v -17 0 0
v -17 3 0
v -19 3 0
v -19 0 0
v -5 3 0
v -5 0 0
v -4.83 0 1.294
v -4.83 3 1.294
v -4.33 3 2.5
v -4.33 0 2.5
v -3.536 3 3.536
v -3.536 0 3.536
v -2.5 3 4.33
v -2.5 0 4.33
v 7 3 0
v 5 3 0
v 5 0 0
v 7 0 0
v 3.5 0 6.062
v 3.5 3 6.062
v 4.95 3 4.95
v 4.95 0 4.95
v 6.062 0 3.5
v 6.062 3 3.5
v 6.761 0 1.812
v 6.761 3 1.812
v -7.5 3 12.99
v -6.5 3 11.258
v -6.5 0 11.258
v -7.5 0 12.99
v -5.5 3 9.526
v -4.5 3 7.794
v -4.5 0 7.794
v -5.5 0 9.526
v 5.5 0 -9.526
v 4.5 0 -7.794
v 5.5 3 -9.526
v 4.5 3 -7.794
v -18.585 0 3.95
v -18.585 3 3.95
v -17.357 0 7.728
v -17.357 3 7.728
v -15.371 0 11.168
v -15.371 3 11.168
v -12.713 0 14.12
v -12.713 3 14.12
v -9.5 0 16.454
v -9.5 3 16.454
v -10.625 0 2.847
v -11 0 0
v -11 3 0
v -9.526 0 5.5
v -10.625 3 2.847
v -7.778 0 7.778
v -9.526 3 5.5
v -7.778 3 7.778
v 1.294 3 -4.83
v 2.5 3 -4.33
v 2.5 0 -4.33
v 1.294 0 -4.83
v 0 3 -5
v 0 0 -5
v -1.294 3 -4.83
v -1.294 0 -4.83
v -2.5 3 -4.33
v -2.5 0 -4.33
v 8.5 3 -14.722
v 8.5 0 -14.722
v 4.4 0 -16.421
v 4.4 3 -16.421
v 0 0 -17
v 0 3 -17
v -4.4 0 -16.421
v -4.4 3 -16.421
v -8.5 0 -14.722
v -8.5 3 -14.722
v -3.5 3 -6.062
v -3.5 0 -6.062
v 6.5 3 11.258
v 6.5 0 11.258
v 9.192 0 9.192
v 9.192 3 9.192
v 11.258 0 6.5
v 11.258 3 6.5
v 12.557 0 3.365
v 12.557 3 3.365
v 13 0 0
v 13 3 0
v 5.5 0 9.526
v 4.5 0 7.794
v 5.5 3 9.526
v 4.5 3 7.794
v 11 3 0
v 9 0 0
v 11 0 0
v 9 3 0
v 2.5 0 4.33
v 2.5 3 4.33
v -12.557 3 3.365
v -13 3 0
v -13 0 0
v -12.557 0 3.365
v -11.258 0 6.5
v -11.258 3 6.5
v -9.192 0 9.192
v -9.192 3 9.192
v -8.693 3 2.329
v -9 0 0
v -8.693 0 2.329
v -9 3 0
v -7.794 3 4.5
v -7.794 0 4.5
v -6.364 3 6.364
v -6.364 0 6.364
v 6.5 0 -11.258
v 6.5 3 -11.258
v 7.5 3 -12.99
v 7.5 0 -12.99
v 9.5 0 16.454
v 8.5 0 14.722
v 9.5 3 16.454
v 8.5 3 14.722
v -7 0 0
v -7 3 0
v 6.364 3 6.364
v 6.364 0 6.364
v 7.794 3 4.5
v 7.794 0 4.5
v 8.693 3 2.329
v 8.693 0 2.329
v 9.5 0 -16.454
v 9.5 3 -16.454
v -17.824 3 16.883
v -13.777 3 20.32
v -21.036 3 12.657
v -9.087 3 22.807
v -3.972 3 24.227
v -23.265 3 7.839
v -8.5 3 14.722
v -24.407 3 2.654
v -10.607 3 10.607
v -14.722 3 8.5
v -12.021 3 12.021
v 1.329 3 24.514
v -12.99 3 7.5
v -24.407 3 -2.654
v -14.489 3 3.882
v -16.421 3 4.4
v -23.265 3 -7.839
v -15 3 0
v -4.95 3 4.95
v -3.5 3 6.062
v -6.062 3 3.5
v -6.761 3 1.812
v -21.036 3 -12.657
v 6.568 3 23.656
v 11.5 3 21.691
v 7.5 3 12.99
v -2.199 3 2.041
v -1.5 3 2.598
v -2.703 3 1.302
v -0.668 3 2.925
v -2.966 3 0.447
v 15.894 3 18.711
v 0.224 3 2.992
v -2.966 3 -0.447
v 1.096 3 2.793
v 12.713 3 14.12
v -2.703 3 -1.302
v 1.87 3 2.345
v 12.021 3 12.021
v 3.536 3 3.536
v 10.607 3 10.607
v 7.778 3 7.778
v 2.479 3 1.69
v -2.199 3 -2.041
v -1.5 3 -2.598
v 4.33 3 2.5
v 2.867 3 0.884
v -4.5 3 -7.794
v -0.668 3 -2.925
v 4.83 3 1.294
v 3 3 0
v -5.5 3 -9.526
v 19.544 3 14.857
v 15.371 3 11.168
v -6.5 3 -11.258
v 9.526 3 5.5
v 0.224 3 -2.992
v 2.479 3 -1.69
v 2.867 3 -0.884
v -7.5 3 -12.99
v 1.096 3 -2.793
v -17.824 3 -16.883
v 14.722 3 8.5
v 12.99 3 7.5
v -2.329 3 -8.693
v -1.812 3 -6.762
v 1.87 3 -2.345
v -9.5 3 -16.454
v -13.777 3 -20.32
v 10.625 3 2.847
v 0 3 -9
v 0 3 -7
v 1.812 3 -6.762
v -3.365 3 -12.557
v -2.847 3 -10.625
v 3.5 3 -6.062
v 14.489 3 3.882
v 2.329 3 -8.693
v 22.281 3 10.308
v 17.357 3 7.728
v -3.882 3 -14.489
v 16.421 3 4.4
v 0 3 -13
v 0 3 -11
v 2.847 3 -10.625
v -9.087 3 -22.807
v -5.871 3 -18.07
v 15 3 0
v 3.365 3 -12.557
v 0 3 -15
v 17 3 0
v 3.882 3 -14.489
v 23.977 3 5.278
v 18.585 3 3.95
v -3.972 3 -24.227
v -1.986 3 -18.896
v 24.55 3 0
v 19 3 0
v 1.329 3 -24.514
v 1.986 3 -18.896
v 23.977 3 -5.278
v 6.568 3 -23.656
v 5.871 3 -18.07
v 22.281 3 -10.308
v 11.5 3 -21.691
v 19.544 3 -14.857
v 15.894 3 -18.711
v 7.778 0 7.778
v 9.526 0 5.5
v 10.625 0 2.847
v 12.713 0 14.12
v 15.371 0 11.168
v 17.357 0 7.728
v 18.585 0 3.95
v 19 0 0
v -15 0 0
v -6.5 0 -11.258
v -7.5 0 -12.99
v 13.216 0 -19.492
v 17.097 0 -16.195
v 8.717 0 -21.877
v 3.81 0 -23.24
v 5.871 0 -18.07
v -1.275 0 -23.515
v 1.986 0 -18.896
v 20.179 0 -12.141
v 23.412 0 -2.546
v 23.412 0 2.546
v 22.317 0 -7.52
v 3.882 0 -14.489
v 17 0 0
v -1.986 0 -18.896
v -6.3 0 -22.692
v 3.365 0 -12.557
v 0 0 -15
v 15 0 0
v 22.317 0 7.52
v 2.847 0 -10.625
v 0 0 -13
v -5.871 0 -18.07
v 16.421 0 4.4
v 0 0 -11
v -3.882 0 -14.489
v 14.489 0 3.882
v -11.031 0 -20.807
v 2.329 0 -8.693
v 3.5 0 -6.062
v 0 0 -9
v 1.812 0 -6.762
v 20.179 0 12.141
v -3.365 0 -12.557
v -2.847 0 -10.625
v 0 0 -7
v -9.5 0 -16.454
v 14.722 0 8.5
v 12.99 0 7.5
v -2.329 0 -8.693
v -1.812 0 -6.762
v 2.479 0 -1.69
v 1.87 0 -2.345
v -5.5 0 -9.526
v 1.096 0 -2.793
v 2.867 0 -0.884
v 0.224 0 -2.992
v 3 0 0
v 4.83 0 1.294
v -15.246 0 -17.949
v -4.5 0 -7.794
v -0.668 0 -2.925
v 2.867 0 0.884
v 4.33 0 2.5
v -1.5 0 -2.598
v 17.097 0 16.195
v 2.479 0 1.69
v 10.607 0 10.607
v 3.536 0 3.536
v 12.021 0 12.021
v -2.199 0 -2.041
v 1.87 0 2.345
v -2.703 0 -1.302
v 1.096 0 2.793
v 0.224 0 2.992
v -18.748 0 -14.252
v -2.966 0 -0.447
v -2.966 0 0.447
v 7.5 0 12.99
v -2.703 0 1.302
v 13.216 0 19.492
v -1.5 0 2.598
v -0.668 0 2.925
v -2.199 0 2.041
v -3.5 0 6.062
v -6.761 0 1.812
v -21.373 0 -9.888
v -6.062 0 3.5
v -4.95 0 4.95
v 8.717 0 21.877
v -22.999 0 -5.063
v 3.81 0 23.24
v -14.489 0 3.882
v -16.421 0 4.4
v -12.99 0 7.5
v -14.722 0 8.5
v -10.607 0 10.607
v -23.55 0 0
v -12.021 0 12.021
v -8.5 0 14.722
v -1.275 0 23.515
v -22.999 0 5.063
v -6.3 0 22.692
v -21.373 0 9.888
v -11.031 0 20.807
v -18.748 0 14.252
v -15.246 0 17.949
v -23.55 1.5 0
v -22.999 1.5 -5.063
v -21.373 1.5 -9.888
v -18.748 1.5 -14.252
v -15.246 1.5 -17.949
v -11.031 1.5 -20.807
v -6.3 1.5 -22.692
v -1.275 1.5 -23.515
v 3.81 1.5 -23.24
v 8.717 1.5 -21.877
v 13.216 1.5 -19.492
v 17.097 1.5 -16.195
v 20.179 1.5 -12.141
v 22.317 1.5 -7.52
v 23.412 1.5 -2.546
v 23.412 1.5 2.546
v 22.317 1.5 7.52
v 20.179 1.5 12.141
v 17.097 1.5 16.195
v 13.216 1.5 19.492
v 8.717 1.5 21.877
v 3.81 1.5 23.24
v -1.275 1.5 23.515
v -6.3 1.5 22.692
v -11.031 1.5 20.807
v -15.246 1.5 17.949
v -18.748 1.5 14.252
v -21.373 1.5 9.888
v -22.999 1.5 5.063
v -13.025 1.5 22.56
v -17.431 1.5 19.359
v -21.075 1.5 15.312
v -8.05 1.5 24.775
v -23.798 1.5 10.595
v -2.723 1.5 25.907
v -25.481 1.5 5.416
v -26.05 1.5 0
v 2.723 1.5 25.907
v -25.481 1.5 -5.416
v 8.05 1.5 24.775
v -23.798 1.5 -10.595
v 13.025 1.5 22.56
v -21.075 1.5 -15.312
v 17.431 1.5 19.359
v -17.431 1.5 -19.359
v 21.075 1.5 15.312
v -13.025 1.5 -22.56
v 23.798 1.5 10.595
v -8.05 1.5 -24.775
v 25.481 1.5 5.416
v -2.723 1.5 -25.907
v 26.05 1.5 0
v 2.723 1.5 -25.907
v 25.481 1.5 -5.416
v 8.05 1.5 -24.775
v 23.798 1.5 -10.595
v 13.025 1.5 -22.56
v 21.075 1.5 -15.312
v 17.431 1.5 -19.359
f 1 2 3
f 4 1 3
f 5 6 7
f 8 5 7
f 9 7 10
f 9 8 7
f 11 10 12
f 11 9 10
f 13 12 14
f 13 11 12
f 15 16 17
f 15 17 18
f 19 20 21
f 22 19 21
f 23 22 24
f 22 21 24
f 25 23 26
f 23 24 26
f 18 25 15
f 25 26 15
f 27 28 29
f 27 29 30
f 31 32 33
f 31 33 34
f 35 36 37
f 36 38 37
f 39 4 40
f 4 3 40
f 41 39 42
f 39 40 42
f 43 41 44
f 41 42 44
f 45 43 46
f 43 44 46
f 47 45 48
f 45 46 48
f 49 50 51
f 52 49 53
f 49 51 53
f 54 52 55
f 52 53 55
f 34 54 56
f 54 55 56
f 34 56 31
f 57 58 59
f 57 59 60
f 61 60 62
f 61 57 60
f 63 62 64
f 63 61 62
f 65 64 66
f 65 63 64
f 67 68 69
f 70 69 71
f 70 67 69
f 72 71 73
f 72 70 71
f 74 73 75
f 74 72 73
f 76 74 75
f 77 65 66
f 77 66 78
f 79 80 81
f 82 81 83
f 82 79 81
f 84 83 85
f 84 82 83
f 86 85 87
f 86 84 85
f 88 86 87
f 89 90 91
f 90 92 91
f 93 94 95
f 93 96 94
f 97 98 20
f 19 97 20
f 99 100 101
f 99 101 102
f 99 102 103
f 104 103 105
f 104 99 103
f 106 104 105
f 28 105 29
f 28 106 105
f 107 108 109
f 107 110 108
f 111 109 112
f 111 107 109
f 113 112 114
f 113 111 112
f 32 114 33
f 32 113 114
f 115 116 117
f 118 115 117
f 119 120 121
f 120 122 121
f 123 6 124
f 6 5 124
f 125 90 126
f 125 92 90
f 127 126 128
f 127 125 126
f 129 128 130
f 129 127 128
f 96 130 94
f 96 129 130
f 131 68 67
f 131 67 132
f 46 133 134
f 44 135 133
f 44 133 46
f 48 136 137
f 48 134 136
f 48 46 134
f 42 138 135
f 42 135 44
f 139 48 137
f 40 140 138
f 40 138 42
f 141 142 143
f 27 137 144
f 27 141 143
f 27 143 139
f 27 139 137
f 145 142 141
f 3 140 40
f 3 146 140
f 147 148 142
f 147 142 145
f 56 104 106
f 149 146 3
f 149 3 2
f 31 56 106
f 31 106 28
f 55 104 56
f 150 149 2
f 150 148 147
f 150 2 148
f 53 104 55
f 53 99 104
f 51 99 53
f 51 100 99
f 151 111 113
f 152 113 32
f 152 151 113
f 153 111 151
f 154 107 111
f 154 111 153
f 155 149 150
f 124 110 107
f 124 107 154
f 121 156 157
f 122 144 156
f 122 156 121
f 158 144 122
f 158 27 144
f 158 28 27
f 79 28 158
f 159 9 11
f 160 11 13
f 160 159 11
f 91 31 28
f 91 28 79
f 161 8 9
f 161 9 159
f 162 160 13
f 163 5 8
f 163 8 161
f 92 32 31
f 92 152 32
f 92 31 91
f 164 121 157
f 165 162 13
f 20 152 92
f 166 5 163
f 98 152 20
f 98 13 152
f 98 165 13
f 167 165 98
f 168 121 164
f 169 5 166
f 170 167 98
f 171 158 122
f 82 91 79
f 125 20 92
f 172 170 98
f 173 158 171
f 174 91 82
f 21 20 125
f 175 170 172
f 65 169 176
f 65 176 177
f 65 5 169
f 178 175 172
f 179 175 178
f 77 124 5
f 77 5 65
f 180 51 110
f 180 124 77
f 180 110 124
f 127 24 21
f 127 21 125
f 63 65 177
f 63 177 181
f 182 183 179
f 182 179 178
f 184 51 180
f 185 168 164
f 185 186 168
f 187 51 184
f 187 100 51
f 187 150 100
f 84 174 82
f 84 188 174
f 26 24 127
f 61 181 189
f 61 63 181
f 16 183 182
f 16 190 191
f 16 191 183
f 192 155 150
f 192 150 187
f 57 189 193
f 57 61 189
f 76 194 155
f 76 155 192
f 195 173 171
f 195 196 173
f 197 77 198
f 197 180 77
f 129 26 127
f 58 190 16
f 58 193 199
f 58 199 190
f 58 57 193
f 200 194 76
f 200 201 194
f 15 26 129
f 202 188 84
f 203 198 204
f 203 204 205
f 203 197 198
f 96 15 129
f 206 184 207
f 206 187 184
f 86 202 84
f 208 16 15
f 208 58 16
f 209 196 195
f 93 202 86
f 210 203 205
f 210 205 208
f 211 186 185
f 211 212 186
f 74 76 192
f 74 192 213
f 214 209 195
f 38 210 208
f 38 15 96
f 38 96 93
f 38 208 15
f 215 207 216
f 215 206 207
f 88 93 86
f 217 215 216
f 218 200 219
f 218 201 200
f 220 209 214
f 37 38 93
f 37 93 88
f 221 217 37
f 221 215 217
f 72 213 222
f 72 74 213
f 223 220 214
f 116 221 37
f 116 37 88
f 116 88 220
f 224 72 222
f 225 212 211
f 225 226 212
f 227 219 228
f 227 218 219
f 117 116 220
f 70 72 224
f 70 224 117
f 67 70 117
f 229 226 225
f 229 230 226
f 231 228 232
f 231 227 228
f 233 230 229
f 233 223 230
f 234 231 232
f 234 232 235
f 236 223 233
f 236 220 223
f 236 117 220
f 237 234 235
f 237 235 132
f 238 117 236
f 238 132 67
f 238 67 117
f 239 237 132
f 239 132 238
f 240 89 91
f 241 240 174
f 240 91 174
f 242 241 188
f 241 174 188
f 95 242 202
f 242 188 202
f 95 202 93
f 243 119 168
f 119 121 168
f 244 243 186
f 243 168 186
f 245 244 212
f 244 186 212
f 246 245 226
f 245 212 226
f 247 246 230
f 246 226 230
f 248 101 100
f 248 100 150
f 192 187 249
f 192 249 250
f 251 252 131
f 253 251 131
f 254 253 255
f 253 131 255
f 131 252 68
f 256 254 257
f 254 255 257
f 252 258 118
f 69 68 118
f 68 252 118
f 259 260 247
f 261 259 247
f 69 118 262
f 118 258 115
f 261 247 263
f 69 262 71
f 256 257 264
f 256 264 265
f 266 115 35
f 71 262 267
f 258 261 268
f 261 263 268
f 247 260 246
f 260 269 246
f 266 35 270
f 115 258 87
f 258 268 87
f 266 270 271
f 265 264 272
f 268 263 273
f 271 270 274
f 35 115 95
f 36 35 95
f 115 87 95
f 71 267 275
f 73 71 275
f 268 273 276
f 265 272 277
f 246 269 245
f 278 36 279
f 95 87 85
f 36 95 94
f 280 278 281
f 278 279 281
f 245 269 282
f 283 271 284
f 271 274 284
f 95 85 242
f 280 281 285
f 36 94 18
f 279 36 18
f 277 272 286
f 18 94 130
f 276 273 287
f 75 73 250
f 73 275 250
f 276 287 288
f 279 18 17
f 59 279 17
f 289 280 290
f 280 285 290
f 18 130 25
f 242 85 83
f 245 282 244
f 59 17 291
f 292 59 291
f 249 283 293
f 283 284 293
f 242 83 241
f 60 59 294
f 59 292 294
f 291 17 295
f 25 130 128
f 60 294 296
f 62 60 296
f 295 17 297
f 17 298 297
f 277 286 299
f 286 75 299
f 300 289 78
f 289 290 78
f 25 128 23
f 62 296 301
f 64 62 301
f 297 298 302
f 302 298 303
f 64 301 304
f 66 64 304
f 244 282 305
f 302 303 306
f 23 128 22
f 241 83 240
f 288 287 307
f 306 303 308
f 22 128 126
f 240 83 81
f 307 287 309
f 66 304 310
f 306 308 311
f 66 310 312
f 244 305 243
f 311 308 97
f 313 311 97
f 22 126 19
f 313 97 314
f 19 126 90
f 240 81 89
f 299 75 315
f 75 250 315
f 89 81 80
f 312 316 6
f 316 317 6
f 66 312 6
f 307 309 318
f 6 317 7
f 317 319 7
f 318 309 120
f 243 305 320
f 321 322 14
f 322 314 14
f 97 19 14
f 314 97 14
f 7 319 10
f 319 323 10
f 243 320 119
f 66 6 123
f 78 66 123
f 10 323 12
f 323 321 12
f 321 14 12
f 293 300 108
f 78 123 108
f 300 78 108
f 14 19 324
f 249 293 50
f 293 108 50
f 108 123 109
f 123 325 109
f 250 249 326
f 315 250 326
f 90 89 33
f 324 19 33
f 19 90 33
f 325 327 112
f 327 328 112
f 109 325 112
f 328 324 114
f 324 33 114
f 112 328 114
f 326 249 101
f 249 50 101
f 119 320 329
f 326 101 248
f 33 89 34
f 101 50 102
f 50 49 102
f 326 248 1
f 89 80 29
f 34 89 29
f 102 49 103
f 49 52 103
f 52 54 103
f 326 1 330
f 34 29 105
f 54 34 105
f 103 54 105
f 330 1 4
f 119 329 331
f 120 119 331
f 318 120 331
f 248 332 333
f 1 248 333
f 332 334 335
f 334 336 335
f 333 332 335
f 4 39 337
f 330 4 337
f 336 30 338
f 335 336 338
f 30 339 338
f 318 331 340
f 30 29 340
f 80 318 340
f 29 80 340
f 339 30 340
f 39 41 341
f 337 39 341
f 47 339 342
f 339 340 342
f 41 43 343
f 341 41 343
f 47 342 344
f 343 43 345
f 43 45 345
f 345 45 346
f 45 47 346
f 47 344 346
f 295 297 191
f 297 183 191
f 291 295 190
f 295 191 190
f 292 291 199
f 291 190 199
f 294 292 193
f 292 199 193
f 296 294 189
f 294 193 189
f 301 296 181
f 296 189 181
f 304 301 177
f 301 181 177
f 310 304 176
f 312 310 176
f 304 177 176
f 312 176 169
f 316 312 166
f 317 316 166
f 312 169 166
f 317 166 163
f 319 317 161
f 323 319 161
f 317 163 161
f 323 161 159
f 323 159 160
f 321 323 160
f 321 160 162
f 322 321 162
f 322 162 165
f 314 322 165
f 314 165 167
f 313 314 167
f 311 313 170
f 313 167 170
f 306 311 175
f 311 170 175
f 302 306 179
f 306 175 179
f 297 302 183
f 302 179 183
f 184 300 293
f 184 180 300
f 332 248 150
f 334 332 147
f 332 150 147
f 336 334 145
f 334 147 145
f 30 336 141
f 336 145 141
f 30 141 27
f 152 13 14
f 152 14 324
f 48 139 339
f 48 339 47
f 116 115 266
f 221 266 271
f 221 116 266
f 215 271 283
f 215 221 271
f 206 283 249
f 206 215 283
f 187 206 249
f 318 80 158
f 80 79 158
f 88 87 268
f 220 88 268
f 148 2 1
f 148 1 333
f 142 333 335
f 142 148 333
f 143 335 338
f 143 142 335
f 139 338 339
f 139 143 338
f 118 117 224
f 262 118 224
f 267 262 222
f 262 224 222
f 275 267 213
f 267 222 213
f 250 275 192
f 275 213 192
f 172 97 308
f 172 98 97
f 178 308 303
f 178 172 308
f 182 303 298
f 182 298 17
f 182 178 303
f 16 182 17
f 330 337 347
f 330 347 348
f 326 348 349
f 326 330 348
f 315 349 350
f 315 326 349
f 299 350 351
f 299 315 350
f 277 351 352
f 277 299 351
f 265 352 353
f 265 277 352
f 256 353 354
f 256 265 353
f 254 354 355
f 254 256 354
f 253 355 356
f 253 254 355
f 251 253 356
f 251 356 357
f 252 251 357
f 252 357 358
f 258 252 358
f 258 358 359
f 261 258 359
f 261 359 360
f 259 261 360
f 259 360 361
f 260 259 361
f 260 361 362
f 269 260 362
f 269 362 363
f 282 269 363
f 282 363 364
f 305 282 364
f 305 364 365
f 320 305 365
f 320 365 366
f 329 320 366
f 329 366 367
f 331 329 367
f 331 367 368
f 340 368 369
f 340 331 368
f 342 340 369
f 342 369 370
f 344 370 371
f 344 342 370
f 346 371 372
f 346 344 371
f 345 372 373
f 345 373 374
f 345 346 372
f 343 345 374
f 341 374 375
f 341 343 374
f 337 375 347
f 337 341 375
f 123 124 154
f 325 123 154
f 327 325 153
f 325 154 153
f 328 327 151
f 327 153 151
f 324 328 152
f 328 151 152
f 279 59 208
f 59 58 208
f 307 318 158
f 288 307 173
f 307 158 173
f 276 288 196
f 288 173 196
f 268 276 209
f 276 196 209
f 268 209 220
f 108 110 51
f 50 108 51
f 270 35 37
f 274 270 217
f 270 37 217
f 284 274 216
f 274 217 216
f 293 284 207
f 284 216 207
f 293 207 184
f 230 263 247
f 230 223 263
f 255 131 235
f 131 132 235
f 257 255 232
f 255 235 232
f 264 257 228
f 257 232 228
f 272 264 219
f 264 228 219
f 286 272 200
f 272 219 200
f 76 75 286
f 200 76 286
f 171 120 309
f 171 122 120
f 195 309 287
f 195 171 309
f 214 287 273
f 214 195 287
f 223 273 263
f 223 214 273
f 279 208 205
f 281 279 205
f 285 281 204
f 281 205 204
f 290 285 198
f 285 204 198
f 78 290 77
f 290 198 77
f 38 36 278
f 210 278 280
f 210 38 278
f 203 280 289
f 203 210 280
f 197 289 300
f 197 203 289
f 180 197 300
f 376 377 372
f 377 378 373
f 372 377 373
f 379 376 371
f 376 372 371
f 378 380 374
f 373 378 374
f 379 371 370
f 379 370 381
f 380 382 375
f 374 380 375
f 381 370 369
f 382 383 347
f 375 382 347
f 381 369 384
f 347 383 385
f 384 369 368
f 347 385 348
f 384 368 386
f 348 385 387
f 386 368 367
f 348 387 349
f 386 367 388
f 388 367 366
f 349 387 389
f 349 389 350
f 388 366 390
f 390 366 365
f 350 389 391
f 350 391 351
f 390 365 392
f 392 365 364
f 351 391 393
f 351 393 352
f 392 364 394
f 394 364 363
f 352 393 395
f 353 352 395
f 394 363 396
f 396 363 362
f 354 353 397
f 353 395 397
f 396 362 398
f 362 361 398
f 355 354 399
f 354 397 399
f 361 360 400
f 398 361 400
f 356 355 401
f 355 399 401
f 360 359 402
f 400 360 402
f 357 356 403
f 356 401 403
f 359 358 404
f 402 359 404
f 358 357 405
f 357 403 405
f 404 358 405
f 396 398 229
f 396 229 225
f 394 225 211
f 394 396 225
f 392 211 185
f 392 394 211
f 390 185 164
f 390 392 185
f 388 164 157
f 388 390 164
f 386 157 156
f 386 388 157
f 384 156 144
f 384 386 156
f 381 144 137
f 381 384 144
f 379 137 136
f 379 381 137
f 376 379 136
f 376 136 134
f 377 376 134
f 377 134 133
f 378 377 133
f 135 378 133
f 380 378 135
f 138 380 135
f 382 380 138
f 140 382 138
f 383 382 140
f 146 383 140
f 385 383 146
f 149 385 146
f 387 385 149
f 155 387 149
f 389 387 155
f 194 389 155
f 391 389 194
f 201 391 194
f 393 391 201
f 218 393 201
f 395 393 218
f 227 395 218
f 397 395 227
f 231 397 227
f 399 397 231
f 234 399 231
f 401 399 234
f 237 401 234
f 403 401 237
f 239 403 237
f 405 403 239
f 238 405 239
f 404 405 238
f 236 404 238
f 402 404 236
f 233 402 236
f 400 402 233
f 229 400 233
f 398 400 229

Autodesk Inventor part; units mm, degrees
ref_plane "YZ Plane" through (0, 0, 0) normal (1, 0, 0) x (0, 1, 0)
ref_plane "XZ Plane" through (0, 0, 0) normal (0, 1, 0) x (-1, 0, 0)
ref_plane "XY Plane" through (0, 0, 0) normal (0, 0, 1) x (1, 0, 0)
sketch "Náčrt1" plane through (0, 0, 0) normal (0, 1, 0) x (-1, 0, 0)
  line L0 (0, -38.2576) -> (0, 38.2576) projected
  line L1 (-38.2576, 0) -> (38.2576, 0) projected
  circle A0 centre (0, 0) radius 23.55
  dimension "d0" = 47.1
extrude "Vysunutí1" add sketch "Náčrt1" along normal blind 1.5
sketch "Náčrt2" plane through (0, 1.5, 0) normal (0, 1, 0) x (1, 0, 0)
  line L0 (0, 36.47) -> (0, -36.47) projected
  line L1 (36.47, 0) -> (-36.47, 0) projected
  circle A0 centre (0, 0) radius 26.05
  dimension "d3" = 52.1
extrude "Vysunutí2" add sketch "Náčrt2" along normal blind 1.5
chamfer "Zkosení1" distance 1.5 angle 45 1 edges at (-26.05, 3, 0)
sketch "Náčrt3" plane through (0, 3, 0) normal (0, 1, 0) x (1, 0, 0)
  line L0 (0, 36.47) -> (0, -36.47) projected
  line L1 (36.47, 0) -> (-36.47, 0) projected
  arc A0 (2.5, 4.3301) -> (-2.5, 4.3301) centre (0, 0) ccw
  arc A1 (3.5, 6.0622) -> (-3.5, 6.0622) centre (0, 0) ccw
  line L2 (-2.5, 4.3301) -> (-3.5, 6.0622)
  line L3 (2.5, 4.3301) -> (3.5, 6.0622)
  arc A2 (4.5, 7.7942) -> (-4.5, 7.7942) centre (0, 0) ccw
  arc A3 (5.5, 9.5263) -> (-5.5, 9.5263) centre (0, 0) ccw
  line L4 (-4.5, 7.7942) -> (-5.5, 9.5263)
  line L5 (4.5, 7.7942) -> (5.5, 9.5263)
  arc A4 (6.5, 11.2583) -> (-6.5, 11.2583) centre (0, 0) ccw
  arc A5 (7.5, 12.9904) -> (-7.5, 12.9904) centre (0, 0) ccw
  line L6 (-6.5, 11.2583) -> (-7.5, 12.9904)
  line L7 (6.5, 11.2583) -> (7.5, 12.9904)
  arc A6 (8.5, 14.7224) -> (-8.5, 14.7224) centre (0, 0) ccw
  arc A7 (9.5, 16.4545) -> (-9.5, 16.4545) centre (0, 0) ccw
  line L8 (-8.5, 14.7224) -> (-9.5, 16.4545)
  line L9 (8.5, 14.7224) -> (9.5, 16.4545)
  dimension "d10" = 5
  dimension "d11" = 7
  dimension "d12" = 60
  dimension "d24" = 9
  dimension "d25" = 11
  dimension "d26" = 13
  dimension "d27" = 15
  dimension "d28" = 17
  dimension "d29" = 19
extrude "Vysunutí3" cut sketch "Náčrt3" against normal through all
pattern_circular "Kruhové pole1" count 3 over 360 about axis through (0, -10, 0) along (0, 1, 0) of "Vysunutí3"
sketch "Náčrt4" plane through (0, 3, 0) normal (0, 1, 0) x (1, 0, 0)
  line L0 (0, 36.47) -> (0, -36.47) projected
  line L1 (36.47, 0) -> (-36.47, 0) projected
  circle A0 centre (0, 0) radius 3
  dimension "d18" = 6
extrude "Vysunutí4" cut sketch "Náčrt4" against normal through all
properties part number "4.L - GM - 01.04" material "LCP plast"
